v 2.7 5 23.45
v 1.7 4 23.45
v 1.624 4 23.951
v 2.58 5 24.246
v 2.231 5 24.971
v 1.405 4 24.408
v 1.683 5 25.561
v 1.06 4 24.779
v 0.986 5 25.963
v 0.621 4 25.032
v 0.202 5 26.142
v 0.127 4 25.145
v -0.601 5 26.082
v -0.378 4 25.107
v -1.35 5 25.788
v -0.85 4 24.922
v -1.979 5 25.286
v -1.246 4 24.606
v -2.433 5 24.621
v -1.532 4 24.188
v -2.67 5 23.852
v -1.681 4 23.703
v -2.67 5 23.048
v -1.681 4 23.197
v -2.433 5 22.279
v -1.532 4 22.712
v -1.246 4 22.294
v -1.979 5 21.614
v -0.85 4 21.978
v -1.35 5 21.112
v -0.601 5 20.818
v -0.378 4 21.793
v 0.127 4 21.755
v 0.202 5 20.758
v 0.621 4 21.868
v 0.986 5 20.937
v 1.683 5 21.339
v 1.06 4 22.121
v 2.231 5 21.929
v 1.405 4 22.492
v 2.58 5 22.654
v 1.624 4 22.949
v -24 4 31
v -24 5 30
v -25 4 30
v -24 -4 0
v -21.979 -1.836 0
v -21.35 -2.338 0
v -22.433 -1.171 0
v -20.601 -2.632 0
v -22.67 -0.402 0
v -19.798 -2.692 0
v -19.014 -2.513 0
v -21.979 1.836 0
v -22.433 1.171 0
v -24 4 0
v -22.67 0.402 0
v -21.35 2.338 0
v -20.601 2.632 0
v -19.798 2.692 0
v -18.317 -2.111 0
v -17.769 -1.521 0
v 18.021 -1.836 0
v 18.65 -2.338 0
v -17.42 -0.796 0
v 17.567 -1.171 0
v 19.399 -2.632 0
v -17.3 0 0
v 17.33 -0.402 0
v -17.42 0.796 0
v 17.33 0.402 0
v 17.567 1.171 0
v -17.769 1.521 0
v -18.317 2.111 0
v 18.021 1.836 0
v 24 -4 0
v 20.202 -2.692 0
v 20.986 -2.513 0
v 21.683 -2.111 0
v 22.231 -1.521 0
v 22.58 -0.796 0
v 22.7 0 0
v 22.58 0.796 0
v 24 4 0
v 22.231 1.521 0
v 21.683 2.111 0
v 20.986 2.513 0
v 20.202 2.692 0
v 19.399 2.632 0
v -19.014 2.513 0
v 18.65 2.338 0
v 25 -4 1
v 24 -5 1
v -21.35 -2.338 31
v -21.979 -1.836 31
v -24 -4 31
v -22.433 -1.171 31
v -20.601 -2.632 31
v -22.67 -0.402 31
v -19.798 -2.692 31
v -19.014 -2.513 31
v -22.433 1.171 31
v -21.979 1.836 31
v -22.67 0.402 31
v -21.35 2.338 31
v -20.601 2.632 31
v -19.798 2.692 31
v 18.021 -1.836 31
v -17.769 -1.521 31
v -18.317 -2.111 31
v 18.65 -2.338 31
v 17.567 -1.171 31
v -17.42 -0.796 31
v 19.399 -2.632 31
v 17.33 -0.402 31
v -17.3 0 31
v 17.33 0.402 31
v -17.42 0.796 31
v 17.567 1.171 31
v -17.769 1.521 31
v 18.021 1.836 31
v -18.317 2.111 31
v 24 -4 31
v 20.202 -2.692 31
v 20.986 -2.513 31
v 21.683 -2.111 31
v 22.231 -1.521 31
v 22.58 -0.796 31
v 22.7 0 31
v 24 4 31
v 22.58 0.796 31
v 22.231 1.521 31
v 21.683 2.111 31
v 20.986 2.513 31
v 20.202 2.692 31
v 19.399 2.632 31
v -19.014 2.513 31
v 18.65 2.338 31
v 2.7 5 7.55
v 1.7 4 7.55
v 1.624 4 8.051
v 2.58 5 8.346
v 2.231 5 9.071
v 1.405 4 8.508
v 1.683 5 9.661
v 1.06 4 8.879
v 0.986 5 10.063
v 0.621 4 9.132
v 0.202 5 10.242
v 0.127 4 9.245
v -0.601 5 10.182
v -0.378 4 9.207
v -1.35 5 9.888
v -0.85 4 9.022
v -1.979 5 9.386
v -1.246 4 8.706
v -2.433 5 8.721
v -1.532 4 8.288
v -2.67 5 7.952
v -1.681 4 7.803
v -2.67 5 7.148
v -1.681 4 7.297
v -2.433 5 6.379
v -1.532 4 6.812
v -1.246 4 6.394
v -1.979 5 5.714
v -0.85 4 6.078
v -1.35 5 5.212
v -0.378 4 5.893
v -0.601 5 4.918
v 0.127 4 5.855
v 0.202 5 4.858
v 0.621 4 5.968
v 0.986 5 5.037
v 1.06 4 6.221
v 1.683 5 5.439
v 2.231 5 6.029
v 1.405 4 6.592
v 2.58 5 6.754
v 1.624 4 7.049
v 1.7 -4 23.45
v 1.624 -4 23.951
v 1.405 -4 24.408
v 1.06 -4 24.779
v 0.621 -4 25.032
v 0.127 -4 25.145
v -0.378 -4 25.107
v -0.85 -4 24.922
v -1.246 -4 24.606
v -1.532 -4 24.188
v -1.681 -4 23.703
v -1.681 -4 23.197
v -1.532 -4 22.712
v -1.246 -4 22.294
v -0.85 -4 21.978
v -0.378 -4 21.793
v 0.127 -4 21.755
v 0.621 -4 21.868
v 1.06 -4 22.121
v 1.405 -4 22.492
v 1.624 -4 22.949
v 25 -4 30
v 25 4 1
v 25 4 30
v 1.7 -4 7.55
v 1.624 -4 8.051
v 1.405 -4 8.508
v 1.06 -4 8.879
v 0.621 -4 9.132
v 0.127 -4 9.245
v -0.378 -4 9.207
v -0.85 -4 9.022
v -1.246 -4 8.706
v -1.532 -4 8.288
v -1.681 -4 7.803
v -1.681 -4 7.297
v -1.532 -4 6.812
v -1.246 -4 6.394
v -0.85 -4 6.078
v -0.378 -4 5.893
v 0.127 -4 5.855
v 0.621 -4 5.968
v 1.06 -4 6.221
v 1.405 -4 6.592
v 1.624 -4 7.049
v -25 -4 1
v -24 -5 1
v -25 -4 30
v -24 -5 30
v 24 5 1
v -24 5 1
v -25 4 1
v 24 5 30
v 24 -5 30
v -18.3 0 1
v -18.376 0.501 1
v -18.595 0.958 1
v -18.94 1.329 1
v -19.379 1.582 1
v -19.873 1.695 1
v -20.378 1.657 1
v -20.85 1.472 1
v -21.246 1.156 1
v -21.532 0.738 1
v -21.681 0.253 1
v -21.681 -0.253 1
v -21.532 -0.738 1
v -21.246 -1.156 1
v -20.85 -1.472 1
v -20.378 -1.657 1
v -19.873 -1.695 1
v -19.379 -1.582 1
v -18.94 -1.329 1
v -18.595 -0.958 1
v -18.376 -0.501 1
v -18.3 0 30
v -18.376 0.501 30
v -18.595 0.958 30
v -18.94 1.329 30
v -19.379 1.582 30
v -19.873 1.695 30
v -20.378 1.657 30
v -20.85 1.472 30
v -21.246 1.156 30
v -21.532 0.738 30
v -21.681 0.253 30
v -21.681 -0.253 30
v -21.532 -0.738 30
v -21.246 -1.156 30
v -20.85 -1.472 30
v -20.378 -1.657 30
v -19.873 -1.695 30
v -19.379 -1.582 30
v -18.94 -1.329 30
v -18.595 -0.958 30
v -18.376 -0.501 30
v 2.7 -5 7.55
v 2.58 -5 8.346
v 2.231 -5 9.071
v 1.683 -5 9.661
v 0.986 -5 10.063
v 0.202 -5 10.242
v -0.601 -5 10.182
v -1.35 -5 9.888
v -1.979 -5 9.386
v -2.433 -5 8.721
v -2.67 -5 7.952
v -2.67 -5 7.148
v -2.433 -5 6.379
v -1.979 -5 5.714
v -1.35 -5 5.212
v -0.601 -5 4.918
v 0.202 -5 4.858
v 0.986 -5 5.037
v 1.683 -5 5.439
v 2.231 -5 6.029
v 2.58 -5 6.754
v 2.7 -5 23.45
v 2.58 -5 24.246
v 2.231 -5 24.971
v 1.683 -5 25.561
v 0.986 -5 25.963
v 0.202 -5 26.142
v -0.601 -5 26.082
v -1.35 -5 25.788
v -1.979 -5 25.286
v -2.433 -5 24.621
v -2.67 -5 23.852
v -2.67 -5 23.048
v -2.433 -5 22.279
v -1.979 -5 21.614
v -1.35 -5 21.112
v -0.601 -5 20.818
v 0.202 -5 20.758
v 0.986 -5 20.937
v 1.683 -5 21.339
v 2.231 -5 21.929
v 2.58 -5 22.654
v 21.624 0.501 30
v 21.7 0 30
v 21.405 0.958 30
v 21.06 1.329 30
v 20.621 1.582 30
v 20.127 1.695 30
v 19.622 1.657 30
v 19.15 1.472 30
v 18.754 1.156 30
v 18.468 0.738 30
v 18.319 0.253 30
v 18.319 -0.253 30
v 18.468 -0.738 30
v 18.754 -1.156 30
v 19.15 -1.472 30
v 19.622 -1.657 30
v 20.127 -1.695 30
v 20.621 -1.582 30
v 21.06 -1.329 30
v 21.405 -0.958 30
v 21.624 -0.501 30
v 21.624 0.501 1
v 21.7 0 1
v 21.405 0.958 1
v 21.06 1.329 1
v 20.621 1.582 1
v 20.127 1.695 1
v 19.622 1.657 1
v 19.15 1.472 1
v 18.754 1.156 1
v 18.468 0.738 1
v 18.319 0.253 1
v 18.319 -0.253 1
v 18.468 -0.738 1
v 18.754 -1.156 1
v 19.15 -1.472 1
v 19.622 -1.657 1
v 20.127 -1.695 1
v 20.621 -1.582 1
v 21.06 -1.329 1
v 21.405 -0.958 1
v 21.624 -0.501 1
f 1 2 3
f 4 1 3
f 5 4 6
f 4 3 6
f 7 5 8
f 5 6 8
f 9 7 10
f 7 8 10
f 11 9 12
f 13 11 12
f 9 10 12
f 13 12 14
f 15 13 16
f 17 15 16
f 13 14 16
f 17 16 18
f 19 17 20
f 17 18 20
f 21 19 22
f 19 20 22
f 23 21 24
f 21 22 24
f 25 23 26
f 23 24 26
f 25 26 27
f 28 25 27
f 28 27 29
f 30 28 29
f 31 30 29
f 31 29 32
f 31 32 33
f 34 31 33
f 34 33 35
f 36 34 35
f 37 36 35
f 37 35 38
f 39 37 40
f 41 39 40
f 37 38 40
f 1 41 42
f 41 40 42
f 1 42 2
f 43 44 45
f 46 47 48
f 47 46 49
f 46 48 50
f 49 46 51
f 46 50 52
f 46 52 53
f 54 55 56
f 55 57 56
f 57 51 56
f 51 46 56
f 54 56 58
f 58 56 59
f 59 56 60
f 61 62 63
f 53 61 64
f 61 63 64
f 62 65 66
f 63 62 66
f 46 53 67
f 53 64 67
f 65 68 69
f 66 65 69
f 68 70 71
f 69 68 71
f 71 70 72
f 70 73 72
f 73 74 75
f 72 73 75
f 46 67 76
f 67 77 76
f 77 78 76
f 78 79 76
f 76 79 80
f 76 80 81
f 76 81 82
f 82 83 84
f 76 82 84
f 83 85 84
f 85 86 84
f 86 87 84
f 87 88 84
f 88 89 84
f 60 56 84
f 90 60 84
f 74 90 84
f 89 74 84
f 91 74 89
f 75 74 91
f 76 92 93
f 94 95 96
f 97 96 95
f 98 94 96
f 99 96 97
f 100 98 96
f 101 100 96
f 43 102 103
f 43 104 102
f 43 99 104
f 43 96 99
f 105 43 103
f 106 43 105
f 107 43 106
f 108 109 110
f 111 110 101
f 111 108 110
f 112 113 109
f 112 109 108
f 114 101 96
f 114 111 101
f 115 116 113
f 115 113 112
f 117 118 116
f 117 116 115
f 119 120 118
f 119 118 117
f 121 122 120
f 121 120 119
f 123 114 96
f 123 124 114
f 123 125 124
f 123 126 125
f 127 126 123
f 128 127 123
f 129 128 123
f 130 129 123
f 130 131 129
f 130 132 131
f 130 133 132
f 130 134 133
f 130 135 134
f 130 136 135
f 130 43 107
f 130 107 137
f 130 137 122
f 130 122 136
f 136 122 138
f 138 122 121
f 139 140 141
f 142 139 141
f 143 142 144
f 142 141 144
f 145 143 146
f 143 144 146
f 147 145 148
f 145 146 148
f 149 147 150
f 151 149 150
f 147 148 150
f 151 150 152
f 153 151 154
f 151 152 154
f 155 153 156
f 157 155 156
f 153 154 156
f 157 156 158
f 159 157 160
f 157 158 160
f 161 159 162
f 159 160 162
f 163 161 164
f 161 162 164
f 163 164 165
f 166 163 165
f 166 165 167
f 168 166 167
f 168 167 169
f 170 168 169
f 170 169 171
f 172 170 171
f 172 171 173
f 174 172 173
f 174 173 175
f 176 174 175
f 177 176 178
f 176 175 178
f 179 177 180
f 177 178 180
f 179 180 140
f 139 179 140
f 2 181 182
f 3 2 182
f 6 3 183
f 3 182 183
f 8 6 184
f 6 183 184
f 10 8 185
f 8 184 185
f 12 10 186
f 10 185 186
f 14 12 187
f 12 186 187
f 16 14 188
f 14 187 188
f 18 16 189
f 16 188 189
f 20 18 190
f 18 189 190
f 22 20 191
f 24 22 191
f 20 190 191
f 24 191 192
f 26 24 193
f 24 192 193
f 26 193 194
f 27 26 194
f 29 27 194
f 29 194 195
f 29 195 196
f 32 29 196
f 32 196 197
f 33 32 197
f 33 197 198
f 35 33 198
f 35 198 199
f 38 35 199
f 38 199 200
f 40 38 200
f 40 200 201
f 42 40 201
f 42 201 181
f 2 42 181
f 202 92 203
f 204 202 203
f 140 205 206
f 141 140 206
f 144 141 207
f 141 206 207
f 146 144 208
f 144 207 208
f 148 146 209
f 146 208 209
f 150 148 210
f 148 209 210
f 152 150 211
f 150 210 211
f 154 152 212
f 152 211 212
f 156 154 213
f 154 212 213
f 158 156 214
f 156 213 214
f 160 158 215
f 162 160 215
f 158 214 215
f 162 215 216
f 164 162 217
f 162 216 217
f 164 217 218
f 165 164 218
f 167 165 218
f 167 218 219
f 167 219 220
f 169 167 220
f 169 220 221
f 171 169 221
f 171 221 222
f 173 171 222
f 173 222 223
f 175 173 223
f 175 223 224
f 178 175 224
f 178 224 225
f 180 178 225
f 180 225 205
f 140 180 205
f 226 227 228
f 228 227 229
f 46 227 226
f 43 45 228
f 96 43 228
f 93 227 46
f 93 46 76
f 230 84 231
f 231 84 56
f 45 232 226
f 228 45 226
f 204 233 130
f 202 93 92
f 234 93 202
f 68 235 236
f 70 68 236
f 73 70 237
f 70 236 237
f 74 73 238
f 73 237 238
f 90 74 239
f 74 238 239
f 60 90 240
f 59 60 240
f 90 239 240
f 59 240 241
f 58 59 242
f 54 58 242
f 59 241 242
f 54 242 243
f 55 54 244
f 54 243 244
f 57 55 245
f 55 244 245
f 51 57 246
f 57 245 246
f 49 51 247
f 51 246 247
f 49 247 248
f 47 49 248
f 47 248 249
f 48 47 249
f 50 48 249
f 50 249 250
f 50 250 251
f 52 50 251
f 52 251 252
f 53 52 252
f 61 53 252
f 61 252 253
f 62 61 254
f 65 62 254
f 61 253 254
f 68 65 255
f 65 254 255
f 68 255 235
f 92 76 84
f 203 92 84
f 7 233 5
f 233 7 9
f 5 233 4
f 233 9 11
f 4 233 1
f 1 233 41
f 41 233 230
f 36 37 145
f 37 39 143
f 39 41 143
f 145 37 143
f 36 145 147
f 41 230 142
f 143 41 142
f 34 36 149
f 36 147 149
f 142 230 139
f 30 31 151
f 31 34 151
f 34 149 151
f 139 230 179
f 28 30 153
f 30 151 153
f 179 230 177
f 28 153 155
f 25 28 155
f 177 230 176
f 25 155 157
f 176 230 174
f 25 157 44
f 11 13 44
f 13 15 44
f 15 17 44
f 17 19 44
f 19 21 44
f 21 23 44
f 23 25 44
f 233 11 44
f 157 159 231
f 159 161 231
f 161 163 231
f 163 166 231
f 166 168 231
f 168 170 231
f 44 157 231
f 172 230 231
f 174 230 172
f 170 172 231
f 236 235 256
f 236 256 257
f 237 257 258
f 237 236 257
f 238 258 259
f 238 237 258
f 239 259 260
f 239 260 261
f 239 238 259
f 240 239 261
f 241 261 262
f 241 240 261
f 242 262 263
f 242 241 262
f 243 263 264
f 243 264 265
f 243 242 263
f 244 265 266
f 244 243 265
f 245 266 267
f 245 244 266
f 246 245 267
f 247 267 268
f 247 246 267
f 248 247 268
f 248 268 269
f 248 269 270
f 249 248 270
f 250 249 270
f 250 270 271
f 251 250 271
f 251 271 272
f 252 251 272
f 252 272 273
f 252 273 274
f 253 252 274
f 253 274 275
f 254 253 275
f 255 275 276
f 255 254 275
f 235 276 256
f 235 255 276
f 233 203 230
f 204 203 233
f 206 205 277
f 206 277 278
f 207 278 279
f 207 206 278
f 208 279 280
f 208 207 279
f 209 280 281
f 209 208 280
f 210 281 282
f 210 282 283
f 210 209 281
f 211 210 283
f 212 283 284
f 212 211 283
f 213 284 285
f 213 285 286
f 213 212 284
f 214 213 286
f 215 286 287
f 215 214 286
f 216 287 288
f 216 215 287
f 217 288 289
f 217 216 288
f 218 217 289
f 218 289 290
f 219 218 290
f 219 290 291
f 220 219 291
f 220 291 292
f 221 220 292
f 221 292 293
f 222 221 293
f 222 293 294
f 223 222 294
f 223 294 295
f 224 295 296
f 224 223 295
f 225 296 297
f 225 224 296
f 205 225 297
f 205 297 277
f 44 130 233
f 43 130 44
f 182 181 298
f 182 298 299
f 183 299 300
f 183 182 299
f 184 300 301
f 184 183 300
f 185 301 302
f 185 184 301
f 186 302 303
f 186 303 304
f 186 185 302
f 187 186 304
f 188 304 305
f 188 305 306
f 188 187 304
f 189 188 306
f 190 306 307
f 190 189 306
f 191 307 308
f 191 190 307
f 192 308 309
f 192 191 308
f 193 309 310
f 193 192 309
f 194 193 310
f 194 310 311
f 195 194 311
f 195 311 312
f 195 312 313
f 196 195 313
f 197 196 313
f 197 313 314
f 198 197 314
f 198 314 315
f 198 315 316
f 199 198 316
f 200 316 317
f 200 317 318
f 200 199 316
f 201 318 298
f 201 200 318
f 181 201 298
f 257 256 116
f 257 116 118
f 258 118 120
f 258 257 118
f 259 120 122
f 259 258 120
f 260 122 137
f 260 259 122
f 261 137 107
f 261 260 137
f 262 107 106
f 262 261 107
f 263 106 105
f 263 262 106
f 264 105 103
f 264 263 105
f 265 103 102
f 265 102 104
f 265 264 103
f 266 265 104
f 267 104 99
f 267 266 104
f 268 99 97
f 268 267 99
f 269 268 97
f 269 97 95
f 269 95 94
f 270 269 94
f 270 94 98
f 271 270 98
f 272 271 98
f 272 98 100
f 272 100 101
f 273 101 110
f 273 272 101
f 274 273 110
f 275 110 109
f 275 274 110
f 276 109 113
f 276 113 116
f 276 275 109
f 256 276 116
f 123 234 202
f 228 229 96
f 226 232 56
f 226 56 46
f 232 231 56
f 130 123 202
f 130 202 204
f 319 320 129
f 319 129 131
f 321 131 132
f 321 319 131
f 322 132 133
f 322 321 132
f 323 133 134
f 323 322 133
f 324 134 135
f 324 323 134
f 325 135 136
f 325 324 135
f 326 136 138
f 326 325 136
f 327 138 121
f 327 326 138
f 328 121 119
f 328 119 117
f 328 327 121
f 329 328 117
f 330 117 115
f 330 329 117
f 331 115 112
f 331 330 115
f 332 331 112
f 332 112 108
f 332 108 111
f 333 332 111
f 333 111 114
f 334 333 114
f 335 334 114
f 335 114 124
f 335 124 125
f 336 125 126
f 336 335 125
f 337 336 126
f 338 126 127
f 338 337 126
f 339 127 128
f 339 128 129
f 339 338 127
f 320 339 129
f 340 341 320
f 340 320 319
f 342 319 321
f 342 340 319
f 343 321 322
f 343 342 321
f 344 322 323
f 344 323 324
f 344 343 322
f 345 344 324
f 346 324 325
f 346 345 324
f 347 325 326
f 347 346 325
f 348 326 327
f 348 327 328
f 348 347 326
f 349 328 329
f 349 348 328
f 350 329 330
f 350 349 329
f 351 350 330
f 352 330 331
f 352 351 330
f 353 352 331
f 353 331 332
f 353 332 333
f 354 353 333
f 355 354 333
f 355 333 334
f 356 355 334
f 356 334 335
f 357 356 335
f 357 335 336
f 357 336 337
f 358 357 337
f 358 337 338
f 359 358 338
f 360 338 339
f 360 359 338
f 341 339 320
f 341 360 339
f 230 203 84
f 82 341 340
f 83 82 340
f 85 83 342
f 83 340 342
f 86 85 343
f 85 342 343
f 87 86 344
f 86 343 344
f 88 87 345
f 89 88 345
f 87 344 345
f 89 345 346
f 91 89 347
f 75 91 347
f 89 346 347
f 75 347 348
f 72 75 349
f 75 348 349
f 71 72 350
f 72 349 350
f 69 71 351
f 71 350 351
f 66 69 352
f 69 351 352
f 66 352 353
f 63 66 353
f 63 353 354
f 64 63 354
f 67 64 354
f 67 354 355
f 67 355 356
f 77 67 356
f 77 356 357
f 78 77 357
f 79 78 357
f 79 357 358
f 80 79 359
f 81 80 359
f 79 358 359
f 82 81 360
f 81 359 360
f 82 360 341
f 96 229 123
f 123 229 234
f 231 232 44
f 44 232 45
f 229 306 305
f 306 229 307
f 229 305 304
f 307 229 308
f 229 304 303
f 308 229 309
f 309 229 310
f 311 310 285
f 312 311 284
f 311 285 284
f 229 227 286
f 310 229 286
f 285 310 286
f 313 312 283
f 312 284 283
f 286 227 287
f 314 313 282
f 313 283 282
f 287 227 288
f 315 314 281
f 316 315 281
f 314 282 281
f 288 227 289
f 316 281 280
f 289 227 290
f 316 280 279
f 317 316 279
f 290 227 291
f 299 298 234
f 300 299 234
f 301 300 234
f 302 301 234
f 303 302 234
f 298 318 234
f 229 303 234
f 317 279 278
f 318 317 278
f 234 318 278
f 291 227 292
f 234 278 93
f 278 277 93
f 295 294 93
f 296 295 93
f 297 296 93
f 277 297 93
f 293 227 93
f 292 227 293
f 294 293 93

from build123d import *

# Parameters (mm, degrees)
SKETCH_R        = 1.7
PAD_DEPTH       = 31
SKETCH001_R     = 1.7
POCKET_DEPTH    = 18
CHAMFER_SIZE    = 1
CHAMFER001_SIZE = 1
CHAMFER002_SIZE = 1


with BuildPart() as part:
    # Sketch → Pad (new body)
    with BuildSketch(Plane.XY):
        Polygon((25, 0), (25, 5), (-25, 5), (-25, 0), (-25, -5), (25, -5), align=None)
        with Locations((-20, 0)):
            Circle(SKETCH_R, mode=Mode.SUBTRACT)
        with Locations((20, 0)):
            Circle(SKETCH_R, mode=Mode.SUBTRACT)
    extrude(amount=PAD_DEPTH)

    # Sketch001 (on Face3 of Pad) → Pocket (cut)
    with BuildSketch(Plane.XZ.offset(5)):
        with Locations((0, 23.45)):
            Circle(SKETCH001_R)
        with Locations((0, 7.55)):
            Circle(SKETCH001_R)
    extrude(amount=-POCKET_DEPTH, mode=Mode.SUBTRACT)

    # Chamfer
    chamfer_edges = [part.edges().sort_by_distance(p)[0] for p in [
        (-21.7, 0, 31),
        (18.3, 0, 31),
        (-21.7, 0, 0),
        (18.3, 0, 0),
    ]]
    chamfer(chamfer_edges, length=CHAMFER_SIZE)

    # Chamfer001
    chamfer001_edges = [part.edges().sort_by_distance(p)[0] for p in [
        (-1.7, -5, 23.45),
        (-1.7, -5, 7.55),
        (-1.7, 5, 7.55),
        (-1.7, 5, 23.45),
    ]]
    chamfer(chamfer001_edges, length=CHAMFER001_SIZE)

    # Chamfer002
    chamfer002_edges = [part.edges().sort_by_distance(p)[0] for p in [
        (25, 5, 15.5),
        (25, -5, 15.5),
        (-25, -5, 15.5),
        (-25, 5, 15.5),
        (0, 5, 31),
        (0, -5, 31),
        (-25, 0, 31),
        (25, 0, 31),
        (25, 0, 0),
        (0, -5, 0),
        (0, 5, 0),
        (-25, 0, 0),
    ]]
    chamfer(chamfer002_edges, length=CHAMFER002_SIZE)


solid = part.part
